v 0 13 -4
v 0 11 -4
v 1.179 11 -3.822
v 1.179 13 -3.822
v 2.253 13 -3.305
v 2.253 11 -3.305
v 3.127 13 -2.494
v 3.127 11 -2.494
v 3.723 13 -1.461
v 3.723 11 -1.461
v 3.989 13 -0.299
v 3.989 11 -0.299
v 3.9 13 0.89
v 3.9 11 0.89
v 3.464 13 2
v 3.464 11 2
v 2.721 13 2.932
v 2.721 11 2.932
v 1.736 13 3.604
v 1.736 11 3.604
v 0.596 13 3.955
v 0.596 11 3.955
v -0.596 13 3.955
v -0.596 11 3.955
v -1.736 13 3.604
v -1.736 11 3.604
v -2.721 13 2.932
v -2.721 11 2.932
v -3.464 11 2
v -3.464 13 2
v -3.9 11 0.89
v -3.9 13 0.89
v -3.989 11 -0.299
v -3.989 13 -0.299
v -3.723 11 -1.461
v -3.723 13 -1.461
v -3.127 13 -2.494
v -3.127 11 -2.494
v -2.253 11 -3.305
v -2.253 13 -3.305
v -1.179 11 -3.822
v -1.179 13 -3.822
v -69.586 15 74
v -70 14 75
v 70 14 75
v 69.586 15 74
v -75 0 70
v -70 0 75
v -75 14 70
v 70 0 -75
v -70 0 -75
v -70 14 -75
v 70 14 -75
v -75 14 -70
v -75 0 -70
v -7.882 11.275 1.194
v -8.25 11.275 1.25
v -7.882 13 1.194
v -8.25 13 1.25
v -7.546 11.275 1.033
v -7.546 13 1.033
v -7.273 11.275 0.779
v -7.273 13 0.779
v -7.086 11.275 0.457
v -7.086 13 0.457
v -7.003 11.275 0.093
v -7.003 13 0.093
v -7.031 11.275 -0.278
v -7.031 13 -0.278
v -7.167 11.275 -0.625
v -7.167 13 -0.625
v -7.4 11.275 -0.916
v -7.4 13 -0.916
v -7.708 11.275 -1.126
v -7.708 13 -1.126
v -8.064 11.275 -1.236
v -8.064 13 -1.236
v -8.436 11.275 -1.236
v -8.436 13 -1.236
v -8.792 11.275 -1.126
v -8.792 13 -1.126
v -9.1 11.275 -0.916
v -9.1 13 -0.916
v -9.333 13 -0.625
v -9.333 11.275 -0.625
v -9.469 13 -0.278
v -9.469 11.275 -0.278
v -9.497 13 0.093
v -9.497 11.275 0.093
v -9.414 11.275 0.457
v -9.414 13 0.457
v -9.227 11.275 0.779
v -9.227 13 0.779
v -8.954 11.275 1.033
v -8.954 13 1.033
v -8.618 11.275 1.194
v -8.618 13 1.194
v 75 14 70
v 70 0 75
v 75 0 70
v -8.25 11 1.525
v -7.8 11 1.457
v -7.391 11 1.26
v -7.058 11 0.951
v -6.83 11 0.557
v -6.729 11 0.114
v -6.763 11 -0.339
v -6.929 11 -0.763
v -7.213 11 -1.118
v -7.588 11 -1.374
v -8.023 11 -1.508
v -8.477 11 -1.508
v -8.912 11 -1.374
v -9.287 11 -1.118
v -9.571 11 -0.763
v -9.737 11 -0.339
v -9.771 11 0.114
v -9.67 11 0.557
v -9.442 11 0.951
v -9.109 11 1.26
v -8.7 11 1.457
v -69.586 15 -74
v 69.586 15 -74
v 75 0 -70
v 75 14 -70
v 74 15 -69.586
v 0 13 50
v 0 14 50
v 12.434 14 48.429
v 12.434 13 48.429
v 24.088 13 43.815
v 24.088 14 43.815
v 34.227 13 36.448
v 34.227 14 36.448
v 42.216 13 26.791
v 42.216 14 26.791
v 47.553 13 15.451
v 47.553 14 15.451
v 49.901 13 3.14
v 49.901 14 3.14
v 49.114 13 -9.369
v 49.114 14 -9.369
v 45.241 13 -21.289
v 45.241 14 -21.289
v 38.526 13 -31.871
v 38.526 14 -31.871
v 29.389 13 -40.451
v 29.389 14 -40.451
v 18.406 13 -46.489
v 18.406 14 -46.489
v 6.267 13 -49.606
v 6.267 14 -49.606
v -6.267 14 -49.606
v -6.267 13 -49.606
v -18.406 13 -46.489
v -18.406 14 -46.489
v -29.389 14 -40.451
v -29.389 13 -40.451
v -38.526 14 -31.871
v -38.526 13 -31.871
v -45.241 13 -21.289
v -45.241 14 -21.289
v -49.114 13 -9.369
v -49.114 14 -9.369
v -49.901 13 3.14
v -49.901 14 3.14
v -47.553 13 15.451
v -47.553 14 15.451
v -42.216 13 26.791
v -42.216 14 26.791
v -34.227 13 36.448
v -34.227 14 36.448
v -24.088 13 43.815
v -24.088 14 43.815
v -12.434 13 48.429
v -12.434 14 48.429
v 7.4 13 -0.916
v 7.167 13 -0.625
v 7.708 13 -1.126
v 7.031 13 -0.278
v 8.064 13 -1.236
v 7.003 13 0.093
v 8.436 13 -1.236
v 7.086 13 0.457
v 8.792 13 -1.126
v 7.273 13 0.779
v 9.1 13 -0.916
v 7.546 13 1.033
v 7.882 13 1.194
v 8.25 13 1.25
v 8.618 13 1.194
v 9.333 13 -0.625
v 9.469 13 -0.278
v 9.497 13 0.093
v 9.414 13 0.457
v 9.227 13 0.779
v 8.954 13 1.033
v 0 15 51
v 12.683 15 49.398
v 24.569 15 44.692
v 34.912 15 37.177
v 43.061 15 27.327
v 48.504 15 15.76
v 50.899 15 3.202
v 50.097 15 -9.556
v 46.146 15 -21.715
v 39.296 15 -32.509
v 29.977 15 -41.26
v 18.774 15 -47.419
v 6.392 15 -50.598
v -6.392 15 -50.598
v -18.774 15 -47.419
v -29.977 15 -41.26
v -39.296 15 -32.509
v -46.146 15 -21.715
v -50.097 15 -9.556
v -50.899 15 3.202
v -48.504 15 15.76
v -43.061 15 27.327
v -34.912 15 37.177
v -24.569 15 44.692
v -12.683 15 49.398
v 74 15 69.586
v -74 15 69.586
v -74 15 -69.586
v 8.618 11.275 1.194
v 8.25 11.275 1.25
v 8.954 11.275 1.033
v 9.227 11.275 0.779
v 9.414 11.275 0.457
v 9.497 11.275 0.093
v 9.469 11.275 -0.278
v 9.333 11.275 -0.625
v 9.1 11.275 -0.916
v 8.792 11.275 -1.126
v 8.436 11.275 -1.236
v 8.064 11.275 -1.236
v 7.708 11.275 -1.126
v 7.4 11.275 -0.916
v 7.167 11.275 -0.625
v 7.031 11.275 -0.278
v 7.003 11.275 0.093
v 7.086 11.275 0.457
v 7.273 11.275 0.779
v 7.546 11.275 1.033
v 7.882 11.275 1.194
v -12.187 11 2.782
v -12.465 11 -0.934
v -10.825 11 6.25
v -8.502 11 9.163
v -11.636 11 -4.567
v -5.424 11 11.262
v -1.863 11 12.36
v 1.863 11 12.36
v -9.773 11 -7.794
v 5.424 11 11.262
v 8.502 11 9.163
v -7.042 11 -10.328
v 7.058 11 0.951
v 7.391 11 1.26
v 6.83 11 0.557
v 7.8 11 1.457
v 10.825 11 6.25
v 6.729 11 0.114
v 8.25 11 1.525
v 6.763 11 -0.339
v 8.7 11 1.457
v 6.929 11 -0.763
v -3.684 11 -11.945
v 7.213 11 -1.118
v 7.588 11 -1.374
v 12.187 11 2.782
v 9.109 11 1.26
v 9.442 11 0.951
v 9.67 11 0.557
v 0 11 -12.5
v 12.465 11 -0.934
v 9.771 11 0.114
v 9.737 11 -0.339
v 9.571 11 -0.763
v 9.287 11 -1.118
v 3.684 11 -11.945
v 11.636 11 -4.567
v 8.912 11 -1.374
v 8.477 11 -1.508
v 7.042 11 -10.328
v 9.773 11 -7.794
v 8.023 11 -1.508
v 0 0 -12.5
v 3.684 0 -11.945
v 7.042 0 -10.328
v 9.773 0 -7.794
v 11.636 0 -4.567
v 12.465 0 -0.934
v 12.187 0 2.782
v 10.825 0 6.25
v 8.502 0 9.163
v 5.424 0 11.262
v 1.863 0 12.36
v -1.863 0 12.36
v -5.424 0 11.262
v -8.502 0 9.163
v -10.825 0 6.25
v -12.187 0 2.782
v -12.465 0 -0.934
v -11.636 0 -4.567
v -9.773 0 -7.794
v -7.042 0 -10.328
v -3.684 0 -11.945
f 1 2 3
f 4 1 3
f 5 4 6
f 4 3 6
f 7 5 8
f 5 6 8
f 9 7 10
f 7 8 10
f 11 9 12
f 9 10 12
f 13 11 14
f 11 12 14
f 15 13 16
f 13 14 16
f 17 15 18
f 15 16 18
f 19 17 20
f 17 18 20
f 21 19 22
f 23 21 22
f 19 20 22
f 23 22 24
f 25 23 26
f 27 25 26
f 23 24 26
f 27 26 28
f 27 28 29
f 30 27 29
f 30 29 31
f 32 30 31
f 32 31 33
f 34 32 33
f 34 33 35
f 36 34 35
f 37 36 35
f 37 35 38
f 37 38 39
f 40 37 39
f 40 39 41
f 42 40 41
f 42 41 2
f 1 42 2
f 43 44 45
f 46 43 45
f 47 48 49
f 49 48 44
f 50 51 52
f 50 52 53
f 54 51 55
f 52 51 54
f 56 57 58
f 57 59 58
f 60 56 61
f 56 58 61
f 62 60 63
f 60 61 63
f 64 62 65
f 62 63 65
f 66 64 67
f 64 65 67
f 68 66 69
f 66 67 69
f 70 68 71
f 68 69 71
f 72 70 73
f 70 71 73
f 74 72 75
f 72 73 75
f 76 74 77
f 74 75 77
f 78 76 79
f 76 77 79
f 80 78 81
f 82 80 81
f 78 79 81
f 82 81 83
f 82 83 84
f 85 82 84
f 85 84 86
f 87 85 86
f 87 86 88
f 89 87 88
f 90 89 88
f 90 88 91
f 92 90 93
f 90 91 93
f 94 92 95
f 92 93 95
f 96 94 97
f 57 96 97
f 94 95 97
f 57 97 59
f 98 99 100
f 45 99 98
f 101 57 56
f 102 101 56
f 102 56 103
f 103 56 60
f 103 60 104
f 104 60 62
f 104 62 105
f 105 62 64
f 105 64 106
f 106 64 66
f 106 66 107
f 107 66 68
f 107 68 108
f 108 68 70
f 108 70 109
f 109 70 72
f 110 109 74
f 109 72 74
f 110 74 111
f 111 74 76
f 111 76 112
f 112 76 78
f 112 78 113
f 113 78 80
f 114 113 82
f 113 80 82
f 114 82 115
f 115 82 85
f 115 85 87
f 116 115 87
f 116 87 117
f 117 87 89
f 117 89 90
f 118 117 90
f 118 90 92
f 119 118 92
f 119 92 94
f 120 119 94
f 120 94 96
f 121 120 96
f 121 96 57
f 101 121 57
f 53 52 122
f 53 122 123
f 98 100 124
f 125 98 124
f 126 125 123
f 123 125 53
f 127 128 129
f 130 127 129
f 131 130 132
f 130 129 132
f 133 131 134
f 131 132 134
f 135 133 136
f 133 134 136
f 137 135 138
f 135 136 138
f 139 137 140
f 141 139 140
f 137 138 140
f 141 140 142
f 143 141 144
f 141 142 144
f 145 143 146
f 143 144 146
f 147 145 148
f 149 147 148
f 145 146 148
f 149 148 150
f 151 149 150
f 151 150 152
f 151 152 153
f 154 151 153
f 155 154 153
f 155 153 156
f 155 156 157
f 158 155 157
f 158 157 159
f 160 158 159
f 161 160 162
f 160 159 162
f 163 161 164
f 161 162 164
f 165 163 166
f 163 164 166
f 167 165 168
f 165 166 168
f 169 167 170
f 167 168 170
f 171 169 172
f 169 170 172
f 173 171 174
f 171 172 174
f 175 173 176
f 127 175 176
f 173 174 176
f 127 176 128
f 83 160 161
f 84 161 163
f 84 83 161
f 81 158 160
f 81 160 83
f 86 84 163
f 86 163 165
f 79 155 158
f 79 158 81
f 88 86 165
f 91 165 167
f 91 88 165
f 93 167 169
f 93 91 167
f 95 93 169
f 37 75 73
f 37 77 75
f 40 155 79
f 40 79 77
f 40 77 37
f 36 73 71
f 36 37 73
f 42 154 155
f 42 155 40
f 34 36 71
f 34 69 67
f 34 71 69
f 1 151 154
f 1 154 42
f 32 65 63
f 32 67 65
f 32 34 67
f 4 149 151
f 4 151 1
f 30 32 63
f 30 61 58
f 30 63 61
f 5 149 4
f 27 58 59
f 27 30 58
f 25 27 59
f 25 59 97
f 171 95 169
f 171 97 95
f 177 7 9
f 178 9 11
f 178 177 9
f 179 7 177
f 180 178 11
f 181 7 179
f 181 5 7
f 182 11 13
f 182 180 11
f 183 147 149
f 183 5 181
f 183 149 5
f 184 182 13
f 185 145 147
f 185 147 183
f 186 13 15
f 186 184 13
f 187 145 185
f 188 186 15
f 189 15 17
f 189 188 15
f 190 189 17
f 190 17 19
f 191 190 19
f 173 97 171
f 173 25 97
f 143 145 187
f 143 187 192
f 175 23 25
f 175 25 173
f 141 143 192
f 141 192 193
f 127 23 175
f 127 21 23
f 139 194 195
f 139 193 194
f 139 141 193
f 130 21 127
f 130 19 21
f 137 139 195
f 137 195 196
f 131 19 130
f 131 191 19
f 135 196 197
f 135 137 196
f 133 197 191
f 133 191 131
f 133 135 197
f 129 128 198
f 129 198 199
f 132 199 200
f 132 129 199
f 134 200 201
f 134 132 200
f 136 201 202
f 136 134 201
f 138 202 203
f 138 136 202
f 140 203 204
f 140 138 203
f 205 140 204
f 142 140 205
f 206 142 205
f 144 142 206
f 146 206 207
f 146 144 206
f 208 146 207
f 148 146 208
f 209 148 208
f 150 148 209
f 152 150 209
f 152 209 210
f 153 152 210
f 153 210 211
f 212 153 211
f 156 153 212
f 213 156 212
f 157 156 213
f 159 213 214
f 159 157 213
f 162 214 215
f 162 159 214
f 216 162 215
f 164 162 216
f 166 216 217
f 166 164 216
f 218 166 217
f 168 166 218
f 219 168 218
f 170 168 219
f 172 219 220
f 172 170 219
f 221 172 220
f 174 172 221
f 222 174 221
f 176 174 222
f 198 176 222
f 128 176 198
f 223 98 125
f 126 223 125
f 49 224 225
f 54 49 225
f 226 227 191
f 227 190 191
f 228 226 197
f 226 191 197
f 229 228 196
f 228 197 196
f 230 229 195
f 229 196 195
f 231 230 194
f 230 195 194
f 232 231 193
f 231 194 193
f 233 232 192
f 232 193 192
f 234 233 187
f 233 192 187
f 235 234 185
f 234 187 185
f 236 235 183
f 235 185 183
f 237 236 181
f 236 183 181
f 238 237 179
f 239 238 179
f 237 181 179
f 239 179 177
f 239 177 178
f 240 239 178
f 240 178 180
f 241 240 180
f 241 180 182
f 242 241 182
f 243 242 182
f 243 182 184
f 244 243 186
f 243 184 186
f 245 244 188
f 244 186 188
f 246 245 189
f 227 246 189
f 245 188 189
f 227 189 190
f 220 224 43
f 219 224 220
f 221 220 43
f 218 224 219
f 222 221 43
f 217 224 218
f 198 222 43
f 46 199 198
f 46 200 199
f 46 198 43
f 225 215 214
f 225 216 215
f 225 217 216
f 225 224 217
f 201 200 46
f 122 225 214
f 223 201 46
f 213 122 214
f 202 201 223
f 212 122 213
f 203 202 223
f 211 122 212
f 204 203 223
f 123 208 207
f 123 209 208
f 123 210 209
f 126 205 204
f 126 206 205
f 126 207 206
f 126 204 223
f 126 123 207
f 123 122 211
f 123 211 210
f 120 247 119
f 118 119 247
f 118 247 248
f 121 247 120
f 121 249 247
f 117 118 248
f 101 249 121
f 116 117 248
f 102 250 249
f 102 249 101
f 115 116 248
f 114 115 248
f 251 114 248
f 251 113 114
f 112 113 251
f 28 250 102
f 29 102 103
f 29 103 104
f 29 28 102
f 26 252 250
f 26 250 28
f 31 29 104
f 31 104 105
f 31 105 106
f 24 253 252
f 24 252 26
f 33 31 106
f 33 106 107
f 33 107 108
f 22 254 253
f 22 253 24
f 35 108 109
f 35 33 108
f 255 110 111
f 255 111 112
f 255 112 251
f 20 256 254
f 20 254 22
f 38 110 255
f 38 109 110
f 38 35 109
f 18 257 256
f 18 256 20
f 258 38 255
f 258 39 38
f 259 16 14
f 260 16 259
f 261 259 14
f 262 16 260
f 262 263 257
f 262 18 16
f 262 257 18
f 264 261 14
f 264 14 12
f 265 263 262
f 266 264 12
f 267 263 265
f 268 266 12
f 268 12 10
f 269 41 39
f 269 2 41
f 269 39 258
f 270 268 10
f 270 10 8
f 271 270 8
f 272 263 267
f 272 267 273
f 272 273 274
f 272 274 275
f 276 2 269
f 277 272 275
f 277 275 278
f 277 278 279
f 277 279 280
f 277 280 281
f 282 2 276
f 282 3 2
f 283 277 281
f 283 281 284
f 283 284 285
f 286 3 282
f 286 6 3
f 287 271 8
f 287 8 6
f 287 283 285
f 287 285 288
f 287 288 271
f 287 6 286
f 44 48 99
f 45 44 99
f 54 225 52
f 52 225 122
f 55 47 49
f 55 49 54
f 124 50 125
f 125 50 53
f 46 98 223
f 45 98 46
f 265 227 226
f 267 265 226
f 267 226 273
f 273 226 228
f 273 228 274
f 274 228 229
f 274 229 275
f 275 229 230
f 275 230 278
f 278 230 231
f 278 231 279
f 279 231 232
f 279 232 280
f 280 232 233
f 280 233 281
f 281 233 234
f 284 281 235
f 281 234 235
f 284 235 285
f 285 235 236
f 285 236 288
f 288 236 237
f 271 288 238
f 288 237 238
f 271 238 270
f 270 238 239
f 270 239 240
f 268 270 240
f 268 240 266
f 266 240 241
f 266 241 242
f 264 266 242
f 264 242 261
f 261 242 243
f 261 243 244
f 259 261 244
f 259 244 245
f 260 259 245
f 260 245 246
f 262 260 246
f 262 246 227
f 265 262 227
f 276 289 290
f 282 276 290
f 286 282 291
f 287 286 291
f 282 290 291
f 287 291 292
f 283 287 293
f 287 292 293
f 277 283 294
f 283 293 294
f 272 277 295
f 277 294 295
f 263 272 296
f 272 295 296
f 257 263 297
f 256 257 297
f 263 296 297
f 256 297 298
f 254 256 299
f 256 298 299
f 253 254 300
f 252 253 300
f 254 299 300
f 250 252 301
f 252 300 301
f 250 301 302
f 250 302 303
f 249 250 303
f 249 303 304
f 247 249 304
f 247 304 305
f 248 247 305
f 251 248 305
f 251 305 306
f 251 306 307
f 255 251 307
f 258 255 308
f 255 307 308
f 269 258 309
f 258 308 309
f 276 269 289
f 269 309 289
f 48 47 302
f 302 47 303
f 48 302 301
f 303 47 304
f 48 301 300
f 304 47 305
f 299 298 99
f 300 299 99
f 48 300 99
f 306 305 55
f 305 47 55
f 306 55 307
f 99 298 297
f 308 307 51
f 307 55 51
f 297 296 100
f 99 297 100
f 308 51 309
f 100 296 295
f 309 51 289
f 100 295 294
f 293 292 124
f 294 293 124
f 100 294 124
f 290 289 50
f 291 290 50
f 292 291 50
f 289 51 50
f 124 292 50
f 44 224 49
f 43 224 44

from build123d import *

# Parameters (mm, degrees)
SKETCH1_W                   = 150
SKETCH1_H                   = 150
BOSS_EXTRUDE1_DEPTH         = 15
SKETCH2_R                   = 12.5
CUT_EXTRUDE1_DEPTH          = 11
SKETCH3_R                   = 4
CUT_EXTRUDE2_DEPTH          = 107.6348911
SKETCH4_R                   = 50
CUT_EXTRUDE3_DEPTH          = 2
M3_TAPPED_HOLE1_D           = 2.5
M3_TAPPED_HOLE1_DEPTH       = 7.5
M3_TAPPED_HOLE1_CSINK_D     = 3.05
M3_TAPPED_HOLE1_CSINK_ANGLE = 90
M3_TAPPED_HOLE1_TIP         = 0.751075774
CHAMFER2_SIZE               = 5
CHAMFER1_SIZE               = 1


with BuildPart() as part:
    # Sketch1 → Boss-Extrude1 (new body)
    with BuildSketch(Plane(origin=(0, 0, 0), x_dir=(1, 0, 0), z_dir=(0, 1, 0))):
        Rectangle(SKETCH1_W, SKETCH1_H)
    extrude(amount=BOSS_EXTRUDE1_DEPTH)

    # Sketch2 → Cut-Extrude1 (cut)
    with BuildSketch(Plane(origin=(0, 0, 0), x_dir=(-1, 0, 0), z_dir=(0, -1, 0))):
        with Locations(Location((0, 0, 0), (0, 0, 90))):
            Circle(SKETCH2_R)
    extrude(amount=-CUT_EXTRUDE1_DEPTH, mode=Mode.SUBTRACT)

    # Sketch3 → Cut-Extrude2 (cut, through all)
    with BuildSketch(Plane(origin=(0, 11, 0), x_dir=(-1, 0, 0), z_dir=(0, -1, 0))):
        with Locations(Location((0, 0, 0), (0, 0, 90))):
            Circle(SKETCH3_R)
    extrude(amount=-CUT_EXTRUDE2_DEPTH, mode=Mode.SUBTRACT)

    # Sketch4 → Cut-Extrude3 (cut)
    with BuildSketch(Plane(origin=(0, 15, 0), x_dir=(1, 0, 0), z_dir=(0, 1, 0))):
        with Locations(Location((0, 0, 0), (0, 0, 270))):
            Circle(SKETCH4_R)
    extrude(amount=-CUT_EXTRUDE3_DEPTH, mode=Mode.SUBTRACT)

    # M3 Tapped Hole1
    with Locations(Plane(origin=(8.25, 11, 0), x_dir=(0, 0, -1), z_dir=(0, -1, 0))):
        with Locations((0, 0), (0, -16.5)):
            CounterSinkHole(M3_TAPPED_HOLE1_D / 2, M3_TAPPED_HOLE1_CSINK_D / 2, depth=M3_TAPPED_HOLE1_DEPTH, counter_sink_angle=M3_TAPPED_HOLE1_CSINK_ANGLE)
            with Locations((0, 0, -(M3_TAPPED_HOLE1_DEPTH + M3_TAPPED_HOLE1_TIP / 2))):  # 118° drill point
                Cone(0, M3_TAPPED_HOLE1_D / 2, M3_TAPPED_HOLE1_TIP, mode=Mode.SUBTRACT)

    # Chamfer2
    chamfer2_edges = [part.edges().sort_by_distance(p)[0] for p in [
        (75, 7.5, 75),
        (-75, 7.5, 75),
        (-75, 7.5, -75),
        (75, 7.5, -75),
    ]]
    chamfer(chamfer2_edges, length=CHAMFER2_SIZE)

    # Chamfer1
    chamfer1_edges = [part.edges().sort_by_distance(p)[0] for p in [
        (0, 15, -50),
        (0, 15, -75),
        (75, 15, 0),
        (-75, 15, 0),
        (0, 15, 75),
        (-72.5, 15, -72.5),
        (-72.5, 15, 72.5),
        (72.5, 15, 72.5),
        (72.5, 15, -72.5),
    ]]
    chamfer(chamfer1_edges, length=CHAMFER1_SIZE)


solid = part.part
